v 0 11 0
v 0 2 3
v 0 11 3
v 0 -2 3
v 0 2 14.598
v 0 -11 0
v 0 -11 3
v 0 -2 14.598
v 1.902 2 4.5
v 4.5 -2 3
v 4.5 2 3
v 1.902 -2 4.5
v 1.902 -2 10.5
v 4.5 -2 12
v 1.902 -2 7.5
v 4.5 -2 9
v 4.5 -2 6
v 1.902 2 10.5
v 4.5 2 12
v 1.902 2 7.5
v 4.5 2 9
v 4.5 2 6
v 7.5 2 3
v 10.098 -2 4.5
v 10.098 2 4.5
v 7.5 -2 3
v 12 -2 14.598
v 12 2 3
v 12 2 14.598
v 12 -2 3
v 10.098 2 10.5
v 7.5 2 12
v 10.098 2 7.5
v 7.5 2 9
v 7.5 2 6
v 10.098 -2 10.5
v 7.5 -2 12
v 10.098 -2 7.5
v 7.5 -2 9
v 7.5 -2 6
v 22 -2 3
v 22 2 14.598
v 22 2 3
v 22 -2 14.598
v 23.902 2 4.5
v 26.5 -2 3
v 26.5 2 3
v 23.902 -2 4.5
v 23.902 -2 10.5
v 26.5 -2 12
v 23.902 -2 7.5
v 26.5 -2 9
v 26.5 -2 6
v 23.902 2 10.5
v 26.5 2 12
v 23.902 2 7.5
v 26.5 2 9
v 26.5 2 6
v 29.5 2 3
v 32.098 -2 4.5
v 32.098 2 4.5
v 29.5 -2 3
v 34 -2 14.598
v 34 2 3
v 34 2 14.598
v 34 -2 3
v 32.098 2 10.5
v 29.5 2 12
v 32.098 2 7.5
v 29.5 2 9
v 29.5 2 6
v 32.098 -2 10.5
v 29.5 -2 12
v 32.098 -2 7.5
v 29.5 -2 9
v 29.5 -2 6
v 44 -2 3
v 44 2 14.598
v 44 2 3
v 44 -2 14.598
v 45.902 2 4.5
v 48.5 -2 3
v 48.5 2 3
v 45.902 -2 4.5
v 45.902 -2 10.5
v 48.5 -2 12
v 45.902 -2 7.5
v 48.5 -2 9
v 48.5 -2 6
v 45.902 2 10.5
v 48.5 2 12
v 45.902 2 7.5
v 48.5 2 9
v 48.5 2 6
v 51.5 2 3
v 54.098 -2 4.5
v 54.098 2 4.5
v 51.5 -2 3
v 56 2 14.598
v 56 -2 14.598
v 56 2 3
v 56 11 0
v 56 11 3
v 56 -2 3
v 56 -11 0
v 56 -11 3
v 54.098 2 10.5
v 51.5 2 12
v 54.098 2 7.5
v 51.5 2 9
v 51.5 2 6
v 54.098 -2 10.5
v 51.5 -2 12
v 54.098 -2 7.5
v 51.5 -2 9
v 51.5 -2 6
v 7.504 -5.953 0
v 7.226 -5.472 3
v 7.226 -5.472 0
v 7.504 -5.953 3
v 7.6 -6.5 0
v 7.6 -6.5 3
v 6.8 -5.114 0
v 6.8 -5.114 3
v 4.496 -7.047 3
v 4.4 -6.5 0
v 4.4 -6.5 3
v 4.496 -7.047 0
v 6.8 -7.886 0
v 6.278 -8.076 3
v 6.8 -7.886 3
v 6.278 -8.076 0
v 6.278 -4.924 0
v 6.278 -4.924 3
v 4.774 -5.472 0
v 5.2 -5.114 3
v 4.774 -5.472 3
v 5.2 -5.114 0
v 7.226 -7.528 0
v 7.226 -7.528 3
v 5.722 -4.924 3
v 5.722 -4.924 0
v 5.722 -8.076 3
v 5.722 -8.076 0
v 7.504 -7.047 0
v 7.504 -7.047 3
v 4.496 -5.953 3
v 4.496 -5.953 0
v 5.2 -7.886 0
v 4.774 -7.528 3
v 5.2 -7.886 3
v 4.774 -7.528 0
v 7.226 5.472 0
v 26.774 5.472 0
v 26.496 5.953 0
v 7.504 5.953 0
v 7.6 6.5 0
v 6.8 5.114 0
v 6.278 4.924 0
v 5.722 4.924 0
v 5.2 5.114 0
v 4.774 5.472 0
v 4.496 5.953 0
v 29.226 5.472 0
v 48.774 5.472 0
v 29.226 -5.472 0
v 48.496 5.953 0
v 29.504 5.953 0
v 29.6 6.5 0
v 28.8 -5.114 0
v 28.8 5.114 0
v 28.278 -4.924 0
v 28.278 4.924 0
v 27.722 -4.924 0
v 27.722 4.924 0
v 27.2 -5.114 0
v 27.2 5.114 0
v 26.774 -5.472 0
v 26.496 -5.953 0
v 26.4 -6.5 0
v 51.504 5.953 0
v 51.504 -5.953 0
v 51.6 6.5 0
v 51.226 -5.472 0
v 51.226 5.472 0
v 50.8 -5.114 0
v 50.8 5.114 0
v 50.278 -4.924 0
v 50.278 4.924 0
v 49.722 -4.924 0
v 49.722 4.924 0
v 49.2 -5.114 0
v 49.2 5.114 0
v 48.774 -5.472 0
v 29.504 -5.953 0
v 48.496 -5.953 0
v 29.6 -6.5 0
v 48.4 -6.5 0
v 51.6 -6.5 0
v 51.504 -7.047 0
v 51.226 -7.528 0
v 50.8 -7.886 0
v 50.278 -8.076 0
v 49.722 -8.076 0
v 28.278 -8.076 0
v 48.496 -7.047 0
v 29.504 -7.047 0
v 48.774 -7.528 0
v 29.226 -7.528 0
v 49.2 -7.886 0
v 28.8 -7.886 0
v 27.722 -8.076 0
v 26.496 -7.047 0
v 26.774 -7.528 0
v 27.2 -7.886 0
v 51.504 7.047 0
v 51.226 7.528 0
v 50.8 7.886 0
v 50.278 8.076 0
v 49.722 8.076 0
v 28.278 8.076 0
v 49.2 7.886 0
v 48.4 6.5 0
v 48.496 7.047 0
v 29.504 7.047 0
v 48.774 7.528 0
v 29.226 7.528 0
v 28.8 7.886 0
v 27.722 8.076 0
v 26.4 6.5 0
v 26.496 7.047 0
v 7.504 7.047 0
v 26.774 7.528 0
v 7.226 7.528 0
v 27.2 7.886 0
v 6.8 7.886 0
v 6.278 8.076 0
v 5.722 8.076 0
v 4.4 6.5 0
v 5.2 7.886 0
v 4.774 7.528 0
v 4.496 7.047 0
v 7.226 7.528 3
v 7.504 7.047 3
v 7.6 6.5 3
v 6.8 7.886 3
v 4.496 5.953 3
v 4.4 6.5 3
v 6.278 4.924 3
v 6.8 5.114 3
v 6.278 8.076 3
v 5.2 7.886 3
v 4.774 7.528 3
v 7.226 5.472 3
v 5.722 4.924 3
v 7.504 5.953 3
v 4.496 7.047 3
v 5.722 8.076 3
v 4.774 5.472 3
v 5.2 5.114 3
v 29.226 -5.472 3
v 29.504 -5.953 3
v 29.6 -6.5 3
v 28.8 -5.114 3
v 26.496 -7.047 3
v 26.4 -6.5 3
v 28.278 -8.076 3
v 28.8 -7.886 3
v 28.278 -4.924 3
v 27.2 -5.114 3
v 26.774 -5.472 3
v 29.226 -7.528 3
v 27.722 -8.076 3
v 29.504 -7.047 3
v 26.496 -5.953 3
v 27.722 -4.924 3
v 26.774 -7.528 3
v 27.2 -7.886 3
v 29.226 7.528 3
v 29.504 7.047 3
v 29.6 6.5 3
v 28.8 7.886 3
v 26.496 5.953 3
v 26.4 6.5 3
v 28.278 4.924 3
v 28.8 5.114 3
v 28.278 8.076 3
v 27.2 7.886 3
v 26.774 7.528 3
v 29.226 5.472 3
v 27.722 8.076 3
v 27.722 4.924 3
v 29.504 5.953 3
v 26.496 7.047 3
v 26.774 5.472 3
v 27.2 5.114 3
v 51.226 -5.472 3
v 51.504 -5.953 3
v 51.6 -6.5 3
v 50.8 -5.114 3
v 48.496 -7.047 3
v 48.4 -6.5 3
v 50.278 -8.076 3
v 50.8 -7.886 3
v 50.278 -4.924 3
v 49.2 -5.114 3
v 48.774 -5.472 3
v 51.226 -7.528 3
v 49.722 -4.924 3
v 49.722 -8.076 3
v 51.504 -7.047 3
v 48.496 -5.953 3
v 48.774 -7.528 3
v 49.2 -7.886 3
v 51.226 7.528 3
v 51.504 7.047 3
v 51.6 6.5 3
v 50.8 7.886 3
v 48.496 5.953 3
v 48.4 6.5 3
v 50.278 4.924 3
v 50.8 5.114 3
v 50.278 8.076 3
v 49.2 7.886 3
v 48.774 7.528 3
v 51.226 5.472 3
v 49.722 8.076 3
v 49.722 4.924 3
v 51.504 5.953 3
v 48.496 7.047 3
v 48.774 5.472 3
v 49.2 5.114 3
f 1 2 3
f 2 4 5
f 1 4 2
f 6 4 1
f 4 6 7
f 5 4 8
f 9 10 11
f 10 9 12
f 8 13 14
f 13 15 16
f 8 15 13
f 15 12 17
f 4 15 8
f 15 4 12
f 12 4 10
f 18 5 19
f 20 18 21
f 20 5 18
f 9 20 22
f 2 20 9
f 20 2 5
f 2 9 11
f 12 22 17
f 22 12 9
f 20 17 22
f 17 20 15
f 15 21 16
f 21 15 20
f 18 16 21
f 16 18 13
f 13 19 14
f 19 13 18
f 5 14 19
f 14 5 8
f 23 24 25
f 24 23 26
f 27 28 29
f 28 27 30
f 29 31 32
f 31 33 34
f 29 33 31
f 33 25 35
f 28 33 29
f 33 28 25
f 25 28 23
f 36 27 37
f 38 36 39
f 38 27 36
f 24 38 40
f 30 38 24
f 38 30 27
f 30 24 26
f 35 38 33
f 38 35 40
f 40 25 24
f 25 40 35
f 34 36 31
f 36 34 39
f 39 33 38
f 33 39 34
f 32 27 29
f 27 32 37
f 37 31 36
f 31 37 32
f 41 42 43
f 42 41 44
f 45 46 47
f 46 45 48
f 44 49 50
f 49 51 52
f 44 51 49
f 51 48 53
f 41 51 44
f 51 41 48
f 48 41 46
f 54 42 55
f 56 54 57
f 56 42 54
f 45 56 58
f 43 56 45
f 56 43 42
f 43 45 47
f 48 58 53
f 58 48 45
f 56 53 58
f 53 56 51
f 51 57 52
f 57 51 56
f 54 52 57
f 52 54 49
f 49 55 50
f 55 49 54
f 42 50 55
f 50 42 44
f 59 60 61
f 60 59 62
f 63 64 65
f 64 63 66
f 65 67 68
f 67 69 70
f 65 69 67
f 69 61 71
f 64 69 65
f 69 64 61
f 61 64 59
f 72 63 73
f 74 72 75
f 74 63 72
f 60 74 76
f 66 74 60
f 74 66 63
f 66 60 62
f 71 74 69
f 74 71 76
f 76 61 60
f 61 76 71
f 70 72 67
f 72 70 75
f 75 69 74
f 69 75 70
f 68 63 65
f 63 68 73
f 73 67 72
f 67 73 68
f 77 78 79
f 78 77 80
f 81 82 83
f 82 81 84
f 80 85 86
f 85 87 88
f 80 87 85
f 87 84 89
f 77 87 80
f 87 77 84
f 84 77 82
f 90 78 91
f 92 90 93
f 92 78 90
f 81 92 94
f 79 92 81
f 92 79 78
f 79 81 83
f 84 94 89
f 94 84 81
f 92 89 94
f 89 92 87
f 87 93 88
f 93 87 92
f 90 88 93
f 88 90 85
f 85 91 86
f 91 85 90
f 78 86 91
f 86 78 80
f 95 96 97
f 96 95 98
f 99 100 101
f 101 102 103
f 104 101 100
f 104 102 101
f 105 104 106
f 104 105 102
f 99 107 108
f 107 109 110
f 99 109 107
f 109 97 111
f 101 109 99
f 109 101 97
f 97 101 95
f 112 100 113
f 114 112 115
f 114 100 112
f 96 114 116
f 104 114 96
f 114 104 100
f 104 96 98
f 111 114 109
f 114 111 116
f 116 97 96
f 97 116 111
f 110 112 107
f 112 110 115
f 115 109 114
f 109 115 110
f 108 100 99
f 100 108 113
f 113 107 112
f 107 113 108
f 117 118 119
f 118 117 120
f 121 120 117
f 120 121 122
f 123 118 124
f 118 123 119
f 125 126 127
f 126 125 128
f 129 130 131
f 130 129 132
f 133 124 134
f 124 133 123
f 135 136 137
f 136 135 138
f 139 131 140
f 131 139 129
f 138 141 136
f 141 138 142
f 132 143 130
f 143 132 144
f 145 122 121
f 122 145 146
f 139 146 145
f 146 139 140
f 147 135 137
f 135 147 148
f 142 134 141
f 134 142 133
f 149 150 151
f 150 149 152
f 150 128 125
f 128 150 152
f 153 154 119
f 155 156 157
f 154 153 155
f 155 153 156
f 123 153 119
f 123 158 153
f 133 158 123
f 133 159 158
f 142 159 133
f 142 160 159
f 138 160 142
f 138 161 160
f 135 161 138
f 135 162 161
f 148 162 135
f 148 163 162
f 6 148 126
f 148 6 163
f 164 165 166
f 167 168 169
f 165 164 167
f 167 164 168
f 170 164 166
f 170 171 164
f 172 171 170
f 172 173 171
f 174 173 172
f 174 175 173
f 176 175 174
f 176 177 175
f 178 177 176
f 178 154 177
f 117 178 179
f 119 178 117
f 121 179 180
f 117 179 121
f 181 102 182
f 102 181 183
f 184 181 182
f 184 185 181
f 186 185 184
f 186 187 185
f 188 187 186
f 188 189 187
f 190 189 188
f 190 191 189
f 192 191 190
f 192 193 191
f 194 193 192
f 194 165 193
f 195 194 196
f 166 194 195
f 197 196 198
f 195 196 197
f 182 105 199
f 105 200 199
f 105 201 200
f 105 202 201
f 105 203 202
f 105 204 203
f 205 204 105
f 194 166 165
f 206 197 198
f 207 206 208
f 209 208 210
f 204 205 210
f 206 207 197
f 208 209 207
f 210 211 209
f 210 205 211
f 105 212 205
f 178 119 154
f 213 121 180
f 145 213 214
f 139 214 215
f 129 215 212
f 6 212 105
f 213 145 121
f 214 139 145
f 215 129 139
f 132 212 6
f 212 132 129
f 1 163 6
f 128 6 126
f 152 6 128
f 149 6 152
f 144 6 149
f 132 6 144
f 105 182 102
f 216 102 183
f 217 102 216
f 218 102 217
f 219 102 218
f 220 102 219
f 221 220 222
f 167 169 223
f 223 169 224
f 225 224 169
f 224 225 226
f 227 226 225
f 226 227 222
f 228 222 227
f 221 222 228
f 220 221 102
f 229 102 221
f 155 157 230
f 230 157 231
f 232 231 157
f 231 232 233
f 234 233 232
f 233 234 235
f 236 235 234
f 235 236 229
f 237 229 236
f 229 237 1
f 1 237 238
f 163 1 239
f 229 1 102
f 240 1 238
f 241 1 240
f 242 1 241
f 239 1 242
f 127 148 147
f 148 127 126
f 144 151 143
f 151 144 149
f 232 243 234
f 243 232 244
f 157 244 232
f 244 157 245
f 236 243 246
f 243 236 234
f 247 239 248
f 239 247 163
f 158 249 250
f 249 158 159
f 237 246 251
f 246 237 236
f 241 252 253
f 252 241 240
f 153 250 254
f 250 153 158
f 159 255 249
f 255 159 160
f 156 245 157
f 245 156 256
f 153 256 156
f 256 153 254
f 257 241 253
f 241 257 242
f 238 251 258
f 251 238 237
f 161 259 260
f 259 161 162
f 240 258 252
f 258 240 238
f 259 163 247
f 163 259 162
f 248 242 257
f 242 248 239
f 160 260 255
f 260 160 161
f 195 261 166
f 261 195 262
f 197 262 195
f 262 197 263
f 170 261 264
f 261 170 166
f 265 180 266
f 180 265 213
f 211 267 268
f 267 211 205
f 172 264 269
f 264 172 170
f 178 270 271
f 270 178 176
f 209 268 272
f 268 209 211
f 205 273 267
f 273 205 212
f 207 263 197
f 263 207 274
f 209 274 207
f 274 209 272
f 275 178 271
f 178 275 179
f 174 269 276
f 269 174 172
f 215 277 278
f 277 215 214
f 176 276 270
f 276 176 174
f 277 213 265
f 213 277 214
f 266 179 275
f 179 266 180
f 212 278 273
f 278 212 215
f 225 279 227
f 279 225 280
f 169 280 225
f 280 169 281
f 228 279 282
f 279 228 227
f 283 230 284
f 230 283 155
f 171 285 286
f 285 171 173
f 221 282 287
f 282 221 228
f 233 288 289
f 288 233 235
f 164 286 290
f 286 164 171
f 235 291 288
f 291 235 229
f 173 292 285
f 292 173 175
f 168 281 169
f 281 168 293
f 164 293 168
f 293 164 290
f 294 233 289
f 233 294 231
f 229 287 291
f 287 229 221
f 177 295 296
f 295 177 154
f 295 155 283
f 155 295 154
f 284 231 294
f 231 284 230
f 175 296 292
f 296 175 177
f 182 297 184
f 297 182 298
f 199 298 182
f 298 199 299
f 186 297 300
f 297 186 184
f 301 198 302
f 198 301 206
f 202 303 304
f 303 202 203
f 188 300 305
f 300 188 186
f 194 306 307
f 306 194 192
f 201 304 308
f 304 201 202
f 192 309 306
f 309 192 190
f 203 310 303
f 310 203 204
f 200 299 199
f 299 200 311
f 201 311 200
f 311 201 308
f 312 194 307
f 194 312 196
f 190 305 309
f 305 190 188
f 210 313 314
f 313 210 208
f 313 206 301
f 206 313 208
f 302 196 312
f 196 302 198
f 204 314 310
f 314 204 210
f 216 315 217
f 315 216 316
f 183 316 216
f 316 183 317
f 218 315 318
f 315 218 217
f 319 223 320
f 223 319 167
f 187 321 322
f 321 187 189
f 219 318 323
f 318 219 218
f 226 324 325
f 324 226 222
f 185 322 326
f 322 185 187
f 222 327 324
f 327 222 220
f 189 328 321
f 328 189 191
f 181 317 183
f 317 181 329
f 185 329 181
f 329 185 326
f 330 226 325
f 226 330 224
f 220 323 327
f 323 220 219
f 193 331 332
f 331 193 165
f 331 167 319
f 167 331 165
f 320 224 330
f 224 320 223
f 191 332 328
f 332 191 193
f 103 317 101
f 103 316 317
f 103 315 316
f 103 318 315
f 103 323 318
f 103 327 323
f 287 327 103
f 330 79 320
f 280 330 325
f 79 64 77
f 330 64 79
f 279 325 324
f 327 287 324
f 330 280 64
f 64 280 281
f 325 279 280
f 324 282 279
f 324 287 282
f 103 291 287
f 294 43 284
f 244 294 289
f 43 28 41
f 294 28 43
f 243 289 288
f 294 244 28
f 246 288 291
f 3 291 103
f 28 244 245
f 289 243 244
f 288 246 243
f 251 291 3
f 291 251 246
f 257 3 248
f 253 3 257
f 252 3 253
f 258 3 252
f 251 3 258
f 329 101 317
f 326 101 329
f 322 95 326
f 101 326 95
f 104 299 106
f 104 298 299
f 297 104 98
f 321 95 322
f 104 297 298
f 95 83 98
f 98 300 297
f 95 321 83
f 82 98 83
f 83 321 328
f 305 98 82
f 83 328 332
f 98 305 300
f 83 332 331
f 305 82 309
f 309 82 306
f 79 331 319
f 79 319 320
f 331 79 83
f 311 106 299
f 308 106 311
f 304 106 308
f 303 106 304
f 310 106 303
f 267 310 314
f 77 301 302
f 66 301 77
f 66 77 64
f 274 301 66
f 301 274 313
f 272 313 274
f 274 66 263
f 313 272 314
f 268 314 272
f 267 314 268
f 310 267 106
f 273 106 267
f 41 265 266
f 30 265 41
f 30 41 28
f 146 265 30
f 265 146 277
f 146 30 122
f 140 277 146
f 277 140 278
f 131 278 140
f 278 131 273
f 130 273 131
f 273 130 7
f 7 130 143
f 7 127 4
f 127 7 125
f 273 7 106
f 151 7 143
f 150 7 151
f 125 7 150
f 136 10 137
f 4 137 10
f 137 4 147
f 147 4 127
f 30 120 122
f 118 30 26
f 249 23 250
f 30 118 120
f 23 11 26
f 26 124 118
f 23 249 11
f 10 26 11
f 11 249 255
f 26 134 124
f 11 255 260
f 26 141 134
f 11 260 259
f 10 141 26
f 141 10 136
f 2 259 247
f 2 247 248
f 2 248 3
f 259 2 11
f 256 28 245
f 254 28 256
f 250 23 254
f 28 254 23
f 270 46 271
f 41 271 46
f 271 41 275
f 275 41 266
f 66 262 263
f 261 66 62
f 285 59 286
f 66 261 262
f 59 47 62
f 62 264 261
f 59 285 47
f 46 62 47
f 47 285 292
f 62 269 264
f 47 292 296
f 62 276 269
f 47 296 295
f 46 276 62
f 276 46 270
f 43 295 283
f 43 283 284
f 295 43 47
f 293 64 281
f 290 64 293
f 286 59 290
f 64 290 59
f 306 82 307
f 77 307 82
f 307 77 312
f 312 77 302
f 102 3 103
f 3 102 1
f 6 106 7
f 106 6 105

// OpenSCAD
//The spacing between the teeth
cable_width = 3;

//The strength (thickness) of the holder clamp
cable_holder_thickness = 4;

//The depth of a tooth
tooth_depth = 3;

//Number of teeth in 1 holder
number_of_teeth = 4;

//The amount of holders on the base
number_of_holders = 3;

//The spacing between the holders
holder_spacing = 10;

/*[Hidden]*/
total_width = number_of_holders * (((tooth_depth*3) + cable_width) + holder_spacing) - holder_spacing;

module cableholder(width, tooth, teeth, thickness)
{
    //translate([-(tooth/2 + ((tooth*2) + width)/2),0,0])
    {
        union()
        {
            for(t=[1:teeth])
            {
                translate([tooth/2,0,t*tooth])
                rotate([90,0,0])
                cylinder(r=tooth,h=thickness,$fn=3,center=true);
            }
        }

        union()
        {
            for(t=[1:teeth])
            {
                translate([tooth/2 + ((tooth*2) + width),0, t*tooth])
                rotate([90,0,180])
                cylinder(r=tooth,h=thickness,$fn=3,center=true);
            }
        }
    }
}

for(h=[1:number_of_holders])
{
    translate([(h-1) * (((tooth_depth*3) + cable_width) + holder_spacing), 0, 0])
    cableholder(cable_width,tooth_depth,number_of_teeth,cable_holder_thickness);
}

render()
translate([0,-cable_holder_thickness/2 - 9,0])
{
    difference()
    {
        cube([total_width,cable_holder_thickness + 18,tooth_depth]);
        
        for(h=[1:number_of_holders])
        {
            translate([(h-1) * (((tooth_depth*3) + cable_width) + holder_spacing) + tooth_depth*1.5 + cable_width/2, 0, 0])
            {
                translate([0,4.5,0])
                cylinder(r=1.6,h=tooth_depth + 1,$fn=18);

                translate([0,4.5 + 9 + cable_holder_thickness,0])
                cylinder(r=1.6,h=tooth_depth + 1,$fn=18);
            }
        }
    }
}
